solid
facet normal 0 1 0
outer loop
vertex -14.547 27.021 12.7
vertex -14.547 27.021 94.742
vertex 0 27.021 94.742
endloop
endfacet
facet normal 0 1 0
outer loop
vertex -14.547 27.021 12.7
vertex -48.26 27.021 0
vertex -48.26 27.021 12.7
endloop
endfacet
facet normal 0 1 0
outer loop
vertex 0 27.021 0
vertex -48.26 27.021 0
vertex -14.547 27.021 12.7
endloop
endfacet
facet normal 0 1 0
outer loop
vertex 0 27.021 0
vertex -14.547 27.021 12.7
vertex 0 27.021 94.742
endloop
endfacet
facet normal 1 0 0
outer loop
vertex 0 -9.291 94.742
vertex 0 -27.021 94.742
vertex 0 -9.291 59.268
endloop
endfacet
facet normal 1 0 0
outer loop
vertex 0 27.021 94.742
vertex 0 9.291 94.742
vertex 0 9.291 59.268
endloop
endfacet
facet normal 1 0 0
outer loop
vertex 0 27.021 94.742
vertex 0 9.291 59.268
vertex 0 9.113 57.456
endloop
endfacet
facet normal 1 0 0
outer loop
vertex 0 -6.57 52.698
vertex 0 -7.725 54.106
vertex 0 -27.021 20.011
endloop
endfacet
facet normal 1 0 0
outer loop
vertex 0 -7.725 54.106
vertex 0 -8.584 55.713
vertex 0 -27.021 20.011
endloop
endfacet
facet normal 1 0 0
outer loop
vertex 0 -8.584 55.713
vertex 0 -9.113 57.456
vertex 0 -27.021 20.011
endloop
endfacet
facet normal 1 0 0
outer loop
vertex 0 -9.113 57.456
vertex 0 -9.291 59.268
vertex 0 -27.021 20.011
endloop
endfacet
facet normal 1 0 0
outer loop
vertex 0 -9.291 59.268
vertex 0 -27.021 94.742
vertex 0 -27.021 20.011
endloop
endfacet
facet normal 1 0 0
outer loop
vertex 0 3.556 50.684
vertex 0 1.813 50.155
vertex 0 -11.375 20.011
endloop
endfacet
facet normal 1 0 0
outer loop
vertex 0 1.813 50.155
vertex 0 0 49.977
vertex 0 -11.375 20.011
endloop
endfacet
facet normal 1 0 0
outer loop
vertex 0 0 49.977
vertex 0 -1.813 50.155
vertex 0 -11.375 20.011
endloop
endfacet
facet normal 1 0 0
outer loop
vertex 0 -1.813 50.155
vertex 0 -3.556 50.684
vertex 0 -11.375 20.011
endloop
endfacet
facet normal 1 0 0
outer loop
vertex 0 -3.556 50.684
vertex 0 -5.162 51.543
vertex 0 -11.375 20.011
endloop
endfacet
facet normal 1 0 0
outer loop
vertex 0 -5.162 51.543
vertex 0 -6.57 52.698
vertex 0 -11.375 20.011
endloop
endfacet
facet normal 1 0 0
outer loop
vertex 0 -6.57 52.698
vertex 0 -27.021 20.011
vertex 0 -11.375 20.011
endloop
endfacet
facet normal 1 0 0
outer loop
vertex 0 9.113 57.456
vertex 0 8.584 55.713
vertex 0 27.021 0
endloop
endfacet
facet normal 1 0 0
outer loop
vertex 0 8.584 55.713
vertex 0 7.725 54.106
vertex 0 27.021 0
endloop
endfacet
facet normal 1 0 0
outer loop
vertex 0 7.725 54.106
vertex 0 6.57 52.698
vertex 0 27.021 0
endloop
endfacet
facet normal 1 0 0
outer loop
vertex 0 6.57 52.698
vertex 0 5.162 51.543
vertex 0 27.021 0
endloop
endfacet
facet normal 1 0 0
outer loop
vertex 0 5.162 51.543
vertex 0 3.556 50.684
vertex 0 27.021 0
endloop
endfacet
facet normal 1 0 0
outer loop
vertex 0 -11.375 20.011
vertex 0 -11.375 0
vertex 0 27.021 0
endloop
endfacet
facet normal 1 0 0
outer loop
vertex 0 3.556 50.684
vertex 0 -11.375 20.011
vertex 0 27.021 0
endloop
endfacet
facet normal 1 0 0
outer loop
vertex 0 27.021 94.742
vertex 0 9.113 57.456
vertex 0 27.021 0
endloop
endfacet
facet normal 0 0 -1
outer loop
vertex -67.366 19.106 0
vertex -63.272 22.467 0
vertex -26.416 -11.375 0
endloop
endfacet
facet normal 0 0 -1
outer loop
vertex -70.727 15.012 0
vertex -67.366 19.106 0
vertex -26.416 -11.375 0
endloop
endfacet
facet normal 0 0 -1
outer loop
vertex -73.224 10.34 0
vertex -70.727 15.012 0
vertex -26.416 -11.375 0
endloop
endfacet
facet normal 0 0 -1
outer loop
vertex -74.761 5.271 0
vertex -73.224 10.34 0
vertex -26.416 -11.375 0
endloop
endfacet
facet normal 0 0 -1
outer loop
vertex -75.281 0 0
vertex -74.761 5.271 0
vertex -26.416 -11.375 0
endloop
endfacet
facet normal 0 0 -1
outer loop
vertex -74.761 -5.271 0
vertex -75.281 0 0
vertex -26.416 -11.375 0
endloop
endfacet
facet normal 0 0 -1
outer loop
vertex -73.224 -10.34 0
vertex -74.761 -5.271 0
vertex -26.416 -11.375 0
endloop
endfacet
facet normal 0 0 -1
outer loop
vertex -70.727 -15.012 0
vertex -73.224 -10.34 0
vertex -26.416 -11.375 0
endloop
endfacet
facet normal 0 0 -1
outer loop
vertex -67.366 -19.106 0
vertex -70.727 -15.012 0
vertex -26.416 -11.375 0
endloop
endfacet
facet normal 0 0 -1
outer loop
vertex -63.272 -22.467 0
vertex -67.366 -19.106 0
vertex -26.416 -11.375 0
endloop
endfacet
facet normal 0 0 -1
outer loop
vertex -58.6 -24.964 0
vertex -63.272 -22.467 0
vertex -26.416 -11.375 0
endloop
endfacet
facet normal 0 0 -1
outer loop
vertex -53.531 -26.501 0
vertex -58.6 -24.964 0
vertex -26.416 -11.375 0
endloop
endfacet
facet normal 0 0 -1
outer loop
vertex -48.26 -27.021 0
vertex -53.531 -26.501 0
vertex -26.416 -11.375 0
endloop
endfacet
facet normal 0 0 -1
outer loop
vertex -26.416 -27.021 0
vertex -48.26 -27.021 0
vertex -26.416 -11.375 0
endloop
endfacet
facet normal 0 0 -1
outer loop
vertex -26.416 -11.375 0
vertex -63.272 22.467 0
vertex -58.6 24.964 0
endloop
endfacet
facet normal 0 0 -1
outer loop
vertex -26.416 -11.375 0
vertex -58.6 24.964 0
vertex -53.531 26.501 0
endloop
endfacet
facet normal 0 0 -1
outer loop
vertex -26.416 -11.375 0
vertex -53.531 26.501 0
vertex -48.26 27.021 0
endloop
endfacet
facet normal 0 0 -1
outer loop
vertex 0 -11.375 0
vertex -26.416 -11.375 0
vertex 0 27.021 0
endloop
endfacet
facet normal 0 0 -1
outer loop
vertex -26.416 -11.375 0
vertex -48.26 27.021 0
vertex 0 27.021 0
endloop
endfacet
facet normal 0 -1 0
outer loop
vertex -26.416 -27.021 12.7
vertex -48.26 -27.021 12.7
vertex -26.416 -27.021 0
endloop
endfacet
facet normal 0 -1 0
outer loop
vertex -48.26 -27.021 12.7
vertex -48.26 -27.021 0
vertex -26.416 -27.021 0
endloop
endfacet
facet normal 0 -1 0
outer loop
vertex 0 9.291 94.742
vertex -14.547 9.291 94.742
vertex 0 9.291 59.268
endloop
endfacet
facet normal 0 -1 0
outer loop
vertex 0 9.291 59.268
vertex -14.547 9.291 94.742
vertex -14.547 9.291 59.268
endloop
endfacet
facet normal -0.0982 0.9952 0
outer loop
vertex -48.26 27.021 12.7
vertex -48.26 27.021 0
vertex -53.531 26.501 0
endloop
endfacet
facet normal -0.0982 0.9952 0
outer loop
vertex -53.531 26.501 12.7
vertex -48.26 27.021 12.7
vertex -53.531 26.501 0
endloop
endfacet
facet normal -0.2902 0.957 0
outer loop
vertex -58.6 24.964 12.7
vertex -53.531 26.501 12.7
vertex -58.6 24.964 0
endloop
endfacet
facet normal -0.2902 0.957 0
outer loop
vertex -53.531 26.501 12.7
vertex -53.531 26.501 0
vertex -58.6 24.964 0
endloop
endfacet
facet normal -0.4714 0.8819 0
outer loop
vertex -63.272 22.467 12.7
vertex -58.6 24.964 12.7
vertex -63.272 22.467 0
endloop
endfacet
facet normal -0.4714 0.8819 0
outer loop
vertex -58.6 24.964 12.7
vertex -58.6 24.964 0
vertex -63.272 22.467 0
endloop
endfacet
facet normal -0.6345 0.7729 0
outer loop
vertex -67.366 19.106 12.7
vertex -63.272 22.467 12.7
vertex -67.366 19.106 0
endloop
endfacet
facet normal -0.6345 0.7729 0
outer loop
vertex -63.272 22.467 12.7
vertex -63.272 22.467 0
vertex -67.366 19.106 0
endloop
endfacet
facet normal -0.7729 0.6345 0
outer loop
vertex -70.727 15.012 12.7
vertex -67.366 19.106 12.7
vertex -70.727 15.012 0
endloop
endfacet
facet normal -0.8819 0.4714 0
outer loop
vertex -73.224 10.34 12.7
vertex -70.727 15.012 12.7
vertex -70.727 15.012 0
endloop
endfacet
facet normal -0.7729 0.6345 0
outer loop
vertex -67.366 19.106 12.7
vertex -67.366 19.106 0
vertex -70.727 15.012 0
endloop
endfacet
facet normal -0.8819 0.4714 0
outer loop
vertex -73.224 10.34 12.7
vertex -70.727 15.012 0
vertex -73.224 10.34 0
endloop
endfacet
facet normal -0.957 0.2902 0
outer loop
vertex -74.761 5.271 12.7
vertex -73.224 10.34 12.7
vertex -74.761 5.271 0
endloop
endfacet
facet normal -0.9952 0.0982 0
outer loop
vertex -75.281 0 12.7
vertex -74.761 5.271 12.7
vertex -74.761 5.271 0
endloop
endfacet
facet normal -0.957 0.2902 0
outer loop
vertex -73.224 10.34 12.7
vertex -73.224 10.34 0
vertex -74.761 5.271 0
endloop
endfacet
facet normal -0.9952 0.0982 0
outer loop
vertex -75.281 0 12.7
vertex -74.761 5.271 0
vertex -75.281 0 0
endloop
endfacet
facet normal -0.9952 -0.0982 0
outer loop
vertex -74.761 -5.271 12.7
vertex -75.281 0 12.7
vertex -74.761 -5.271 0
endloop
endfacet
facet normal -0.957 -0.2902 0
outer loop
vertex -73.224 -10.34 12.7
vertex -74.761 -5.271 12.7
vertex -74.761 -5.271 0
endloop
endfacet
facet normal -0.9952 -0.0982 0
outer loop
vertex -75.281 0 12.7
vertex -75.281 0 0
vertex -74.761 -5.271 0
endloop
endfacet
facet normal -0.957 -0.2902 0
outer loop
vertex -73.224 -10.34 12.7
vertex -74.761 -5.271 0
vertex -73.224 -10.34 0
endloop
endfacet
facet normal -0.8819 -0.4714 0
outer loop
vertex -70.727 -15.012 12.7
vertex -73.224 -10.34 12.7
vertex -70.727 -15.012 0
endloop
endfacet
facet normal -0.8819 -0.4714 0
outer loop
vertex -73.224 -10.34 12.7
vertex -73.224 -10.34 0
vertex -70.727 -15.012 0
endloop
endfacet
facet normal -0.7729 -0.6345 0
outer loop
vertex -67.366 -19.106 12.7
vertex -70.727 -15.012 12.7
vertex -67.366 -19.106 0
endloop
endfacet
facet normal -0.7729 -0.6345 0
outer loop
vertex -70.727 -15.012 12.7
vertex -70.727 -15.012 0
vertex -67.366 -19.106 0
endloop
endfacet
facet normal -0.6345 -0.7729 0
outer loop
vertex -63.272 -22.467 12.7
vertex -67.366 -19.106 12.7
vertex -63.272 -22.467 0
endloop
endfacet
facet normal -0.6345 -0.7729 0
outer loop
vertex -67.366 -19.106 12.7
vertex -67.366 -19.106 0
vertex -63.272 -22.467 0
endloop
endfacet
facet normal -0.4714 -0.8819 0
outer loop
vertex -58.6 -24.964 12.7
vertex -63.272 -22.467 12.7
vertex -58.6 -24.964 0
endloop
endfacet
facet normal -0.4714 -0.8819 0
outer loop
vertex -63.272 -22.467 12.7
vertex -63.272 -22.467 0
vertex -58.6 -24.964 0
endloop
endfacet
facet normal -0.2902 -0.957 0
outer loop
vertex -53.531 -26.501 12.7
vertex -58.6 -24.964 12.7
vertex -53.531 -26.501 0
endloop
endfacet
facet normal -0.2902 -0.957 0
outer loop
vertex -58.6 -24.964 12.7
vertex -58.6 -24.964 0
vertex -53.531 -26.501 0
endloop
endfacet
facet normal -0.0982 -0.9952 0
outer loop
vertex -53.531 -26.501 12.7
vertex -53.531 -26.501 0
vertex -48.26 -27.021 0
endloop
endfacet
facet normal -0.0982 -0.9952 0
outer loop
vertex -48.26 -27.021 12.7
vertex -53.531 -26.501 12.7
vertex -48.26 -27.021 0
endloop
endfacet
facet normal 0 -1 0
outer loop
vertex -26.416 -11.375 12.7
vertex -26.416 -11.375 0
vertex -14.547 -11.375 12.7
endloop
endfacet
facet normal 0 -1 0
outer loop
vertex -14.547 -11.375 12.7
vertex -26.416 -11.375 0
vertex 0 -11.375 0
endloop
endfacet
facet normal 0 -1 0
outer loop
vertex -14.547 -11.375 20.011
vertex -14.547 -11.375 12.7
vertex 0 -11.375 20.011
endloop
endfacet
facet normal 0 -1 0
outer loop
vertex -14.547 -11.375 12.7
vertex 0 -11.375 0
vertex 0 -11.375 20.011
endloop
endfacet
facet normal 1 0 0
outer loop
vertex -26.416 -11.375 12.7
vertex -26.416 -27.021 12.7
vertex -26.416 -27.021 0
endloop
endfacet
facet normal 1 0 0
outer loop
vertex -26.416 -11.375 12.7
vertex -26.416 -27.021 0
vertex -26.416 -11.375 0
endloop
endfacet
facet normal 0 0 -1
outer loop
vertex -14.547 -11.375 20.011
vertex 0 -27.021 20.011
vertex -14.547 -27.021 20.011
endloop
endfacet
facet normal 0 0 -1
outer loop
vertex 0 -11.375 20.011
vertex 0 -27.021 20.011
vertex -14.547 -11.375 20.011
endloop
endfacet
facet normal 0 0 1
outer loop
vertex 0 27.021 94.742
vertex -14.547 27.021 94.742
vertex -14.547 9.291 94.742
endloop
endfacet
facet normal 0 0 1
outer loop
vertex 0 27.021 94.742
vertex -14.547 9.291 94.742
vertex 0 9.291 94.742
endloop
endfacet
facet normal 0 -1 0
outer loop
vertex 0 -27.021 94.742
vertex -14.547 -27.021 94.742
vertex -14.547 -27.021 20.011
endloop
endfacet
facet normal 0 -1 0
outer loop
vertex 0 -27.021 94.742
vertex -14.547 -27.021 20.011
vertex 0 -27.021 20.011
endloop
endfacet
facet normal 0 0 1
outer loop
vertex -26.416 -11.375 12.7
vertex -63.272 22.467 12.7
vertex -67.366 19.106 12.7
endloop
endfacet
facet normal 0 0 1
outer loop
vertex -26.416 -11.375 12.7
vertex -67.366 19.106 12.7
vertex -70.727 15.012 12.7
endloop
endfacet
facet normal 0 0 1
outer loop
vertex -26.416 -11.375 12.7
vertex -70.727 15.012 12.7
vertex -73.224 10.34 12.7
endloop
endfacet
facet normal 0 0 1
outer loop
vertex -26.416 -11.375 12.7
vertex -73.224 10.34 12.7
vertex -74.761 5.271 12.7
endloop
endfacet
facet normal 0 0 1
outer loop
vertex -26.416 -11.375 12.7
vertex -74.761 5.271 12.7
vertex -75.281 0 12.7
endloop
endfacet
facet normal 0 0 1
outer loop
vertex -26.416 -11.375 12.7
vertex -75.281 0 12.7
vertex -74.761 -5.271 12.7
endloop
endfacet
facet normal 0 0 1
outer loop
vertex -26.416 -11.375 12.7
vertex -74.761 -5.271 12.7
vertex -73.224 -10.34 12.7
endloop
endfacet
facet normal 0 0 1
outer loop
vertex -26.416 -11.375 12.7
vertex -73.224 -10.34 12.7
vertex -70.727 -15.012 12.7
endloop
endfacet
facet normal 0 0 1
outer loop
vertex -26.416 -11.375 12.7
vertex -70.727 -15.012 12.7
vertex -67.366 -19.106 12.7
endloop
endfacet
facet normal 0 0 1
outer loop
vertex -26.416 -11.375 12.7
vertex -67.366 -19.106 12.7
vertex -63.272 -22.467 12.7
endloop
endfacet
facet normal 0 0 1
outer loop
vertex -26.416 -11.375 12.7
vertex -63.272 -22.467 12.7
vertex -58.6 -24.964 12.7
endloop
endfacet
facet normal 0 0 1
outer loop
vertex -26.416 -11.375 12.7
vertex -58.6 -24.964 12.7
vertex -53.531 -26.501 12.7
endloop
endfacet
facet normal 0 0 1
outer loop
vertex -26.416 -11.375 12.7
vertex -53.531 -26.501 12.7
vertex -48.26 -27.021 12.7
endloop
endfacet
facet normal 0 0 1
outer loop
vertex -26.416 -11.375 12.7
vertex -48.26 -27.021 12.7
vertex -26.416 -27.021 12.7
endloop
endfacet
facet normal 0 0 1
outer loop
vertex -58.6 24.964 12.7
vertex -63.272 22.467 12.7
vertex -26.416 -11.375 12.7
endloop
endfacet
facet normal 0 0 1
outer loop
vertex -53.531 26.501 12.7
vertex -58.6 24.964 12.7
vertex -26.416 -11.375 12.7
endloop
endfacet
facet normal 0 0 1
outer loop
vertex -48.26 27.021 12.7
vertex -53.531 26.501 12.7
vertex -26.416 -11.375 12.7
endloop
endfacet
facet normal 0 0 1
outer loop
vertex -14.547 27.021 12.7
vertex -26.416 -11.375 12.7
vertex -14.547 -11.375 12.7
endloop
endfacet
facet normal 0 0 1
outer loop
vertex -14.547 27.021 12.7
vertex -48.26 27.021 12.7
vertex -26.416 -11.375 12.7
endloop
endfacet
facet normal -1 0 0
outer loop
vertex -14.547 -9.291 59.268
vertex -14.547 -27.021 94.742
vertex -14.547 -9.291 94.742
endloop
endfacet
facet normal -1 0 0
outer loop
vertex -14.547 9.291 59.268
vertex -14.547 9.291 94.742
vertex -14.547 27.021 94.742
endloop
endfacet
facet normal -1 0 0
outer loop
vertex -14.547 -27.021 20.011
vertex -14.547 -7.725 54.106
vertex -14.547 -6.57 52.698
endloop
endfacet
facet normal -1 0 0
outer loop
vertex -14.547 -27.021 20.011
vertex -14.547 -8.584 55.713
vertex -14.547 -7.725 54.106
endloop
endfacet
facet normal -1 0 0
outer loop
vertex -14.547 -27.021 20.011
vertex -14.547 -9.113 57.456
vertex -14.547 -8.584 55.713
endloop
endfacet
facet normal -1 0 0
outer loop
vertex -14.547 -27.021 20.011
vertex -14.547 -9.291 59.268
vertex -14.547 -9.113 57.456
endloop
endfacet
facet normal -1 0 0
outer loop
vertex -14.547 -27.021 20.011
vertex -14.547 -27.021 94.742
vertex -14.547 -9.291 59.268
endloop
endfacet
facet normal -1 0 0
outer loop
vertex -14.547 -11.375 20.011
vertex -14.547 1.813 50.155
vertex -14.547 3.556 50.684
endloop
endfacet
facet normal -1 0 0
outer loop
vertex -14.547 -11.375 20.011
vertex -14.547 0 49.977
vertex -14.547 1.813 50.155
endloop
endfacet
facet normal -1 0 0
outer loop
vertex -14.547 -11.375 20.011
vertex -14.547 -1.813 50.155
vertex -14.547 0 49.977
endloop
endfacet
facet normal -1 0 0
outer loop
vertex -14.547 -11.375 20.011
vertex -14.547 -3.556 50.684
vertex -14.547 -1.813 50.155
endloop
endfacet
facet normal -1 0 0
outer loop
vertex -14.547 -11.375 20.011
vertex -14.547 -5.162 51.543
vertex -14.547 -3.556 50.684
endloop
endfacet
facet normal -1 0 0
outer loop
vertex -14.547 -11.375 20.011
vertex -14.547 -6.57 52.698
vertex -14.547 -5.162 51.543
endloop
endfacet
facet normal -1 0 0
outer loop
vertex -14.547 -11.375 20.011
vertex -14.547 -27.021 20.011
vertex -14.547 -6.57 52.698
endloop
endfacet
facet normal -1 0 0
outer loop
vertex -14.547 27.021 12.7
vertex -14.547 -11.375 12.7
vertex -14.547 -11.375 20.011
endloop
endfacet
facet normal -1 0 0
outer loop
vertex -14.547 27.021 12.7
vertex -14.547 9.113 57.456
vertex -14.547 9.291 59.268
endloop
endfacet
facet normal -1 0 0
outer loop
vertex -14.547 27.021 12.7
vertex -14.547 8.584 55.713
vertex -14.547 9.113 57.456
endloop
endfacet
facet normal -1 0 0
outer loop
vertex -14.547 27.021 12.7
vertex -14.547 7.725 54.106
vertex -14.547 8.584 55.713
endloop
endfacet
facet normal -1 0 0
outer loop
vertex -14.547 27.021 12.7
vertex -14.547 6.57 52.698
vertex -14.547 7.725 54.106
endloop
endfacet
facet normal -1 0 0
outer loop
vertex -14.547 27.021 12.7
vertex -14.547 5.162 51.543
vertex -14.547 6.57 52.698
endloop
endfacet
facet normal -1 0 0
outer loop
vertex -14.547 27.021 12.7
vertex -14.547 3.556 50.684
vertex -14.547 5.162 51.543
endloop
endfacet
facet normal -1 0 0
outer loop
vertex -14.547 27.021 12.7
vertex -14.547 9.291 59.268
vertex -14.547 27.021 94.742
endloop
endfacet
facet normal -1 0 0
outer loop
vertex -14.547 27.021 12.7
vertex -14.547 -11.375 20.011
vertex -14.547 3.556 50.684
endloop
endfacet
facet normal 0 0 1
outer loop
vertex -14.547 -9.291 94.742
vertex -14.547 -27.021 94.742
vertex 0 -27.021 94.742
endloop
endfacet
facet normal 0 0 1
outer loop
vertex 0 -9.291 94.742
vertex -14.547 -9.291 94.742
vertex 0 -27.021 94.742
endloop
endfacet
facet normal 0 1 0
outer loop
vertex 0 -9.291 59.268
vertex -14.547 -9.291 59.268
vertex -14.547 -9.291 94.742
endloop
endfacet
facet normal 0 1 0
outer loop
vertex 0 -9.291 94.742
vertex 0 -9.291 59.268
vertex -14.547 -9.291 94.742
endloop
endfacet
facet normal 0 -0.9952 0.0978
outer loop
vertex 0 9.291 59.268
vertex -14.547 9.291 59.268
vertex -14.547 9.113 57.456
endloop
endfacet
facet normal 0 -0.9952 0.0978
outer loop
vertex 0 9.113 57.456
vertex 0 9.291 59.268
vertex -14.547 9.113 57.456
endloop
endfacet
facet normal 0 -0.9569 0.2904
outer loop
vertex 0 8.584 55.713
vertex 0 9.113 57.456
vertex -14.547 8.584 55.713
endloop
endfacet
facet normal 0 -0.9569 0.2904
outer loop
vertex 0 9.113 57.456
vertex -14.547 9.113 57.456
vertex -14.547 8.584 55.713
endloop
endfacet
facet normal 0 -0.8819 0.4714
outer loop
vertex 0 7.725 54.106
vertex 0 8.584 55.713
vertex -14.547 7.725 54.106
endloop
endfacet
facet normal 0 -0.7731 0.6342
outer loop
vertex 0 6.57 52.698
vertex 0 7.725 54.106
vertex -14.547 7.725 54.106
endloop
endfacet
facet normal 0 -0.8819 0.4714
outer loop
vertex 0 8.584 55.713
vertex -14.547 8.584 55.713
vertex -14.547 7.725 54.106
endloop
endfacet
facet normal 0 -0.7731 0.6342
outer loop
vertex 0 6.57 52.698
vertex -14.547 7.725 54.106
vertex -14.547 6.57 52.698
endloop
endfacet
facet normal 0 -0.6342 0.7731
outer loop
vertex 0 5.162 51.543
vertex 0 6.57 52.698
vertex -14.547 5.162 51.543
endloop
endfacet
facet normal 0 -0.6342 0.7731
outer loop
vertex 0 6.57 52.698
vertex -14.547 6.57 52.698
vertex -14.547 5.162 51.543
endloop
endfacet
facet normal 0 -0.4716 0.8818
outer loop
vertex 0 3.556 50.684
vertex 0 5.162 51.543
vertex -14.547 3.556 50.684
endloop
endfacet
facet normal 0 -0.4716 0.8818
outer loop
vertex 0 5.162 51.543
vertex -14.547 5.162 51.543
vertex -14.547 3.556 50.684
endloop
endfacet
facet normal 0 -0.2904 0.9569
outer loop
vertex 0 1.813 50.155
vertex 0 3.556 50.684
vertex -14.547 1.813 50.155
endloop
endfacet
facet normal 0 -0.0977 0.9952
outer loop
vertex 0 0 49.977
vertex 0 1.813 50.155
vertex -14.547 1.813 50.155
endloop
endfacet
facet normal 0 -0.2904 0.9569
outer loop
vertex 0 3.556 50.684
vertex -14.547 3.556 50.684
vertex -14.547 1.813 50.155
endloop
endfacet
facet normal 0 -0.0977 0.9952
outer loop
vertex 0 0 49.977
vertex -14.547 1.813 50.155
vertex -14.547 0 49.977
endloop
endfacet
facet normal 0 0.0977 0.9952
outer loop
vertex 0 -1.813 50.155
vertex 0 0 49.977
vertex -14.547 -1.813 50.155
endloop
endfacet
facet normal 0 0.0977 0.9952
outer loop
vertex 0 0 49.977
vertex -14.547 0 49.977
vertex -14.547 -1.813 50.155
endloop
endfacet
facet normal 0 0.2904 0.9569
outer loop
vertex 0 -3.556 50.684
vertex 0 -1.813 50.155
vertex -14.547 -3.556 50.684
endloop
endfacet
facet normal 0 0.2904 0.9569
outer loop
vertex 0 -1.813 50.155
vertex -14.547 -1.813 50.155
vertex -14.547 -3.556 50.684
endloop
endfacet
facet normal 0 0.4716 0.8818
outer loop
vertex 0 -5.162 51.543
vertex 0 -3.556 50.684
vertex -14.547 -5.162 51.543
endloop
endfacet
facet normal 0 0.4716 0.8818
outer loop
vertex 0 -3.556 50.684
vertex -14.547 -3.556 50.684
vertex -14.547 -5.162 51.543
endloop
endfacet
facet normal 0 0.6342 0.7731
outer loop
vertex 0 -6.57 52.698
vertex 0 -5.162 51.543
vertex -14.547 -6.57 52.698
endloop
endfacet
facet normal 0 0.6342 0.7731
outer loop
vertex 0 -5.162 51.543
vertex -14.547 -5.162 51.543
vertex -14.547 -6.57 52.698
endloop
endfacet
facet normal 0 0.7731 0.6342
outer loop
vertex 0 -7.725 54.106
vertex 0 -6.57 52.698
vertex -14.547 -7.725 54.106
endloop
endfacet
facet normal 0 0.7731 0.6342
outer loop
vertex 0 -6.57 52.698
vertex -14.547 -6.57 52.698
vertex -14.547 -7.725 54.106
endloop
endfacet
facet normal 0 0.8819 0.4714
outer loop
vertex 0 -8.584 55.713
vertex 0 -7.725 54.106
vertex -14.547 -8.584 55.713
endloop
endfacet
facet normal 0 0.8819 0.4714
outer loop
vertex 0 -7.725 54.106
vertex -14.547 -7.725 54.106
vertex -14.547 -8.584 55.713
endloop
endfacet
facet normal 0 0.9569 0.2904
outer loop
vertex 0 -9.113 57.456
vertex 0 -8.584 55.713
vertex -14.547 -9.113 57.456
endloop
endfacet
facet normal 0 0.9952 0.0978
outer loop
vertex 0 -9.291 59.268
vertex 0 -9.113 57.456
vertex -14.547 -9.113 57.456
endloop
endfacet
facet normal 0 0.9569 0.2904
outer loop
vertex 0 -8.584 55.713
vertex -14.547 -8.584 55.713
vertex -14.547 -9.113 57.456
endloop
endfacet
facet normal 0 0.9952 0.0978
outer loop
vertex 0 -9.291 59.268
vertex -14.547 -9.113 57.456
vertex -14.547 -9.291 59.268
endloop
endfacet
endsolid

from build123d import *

# Parameters (mm, degrees)
F1_DEPTH = 12.7
F2_W     = 14.5472725853
F2_H     = 54.0411157981
F3_DEPTH = 82.042
F5_DEPTH = 25.4
F6_W     = 15.6459464915
F6_H     = 20.0112983584
F7_DEPTH = 26.416


with BuildPart() as f1:
    # F0 (on Top) → F1 (new body)
    with BuildSketch(Plane.XY):
        with BuildLine():
            Line((0, 27.020557899), (-48.259999603, 27.020557899))
            ThreePointArc((-48.259999603, 27.020557899), (-75.2805575021, 0), (-48.259999603, -27.020557899))
            Line((-48.259999603, -27.020557899), (0, -27.020557899))
            Line((0, -27.020557899), (0, 27.020557899))
        make_face()
    extrude(amount=F1_DEPTH)

    # F2 (on face) → F3 (join)
    with BuildSketch(Plane.XY.offset(12.7)):
        with Locations((-7.2736362927, 0)):
            Rectangle(F2_W, F2_H)
    extrude(amount=F3_DEPTH)

    # F4 (on face) → F5 (cut)
    with BuildSketch(Plane(origin=(-14.5472725853, 0, 0), x_dir=(0, -1, 0), z_dir=(-1, 0, 0))):
        with BuildLine():
            Line((-9.2913275192, 94.742), (-9.2913275192, 59.2682287097))
            ThreePointArc((-9.2913275192, 59.2682287097), (0, 49.9769011905), (9.2913275192, 59.2682287097))
            Line((9.2913275192, 59.2682287097), (9.2913275192, 94.742))
            Line((9.2913275192, 94.742), (-9.2913275192, 94.742))
        make_face()
    extrude(amount=-F5_DEPTH, mode=Mode.SUBTRACT)

    # F6 (on face) → F7 (cut)
    with BuildSketch(Plane.YZ):
        with Locations((-19.1975846533, 10.0056491792)):
            Rectangle(F6_W, F6_H)
    extrude(amount=-F7_DEPTH, mode=Mode.SUBTRACT)


solid = f1.part
